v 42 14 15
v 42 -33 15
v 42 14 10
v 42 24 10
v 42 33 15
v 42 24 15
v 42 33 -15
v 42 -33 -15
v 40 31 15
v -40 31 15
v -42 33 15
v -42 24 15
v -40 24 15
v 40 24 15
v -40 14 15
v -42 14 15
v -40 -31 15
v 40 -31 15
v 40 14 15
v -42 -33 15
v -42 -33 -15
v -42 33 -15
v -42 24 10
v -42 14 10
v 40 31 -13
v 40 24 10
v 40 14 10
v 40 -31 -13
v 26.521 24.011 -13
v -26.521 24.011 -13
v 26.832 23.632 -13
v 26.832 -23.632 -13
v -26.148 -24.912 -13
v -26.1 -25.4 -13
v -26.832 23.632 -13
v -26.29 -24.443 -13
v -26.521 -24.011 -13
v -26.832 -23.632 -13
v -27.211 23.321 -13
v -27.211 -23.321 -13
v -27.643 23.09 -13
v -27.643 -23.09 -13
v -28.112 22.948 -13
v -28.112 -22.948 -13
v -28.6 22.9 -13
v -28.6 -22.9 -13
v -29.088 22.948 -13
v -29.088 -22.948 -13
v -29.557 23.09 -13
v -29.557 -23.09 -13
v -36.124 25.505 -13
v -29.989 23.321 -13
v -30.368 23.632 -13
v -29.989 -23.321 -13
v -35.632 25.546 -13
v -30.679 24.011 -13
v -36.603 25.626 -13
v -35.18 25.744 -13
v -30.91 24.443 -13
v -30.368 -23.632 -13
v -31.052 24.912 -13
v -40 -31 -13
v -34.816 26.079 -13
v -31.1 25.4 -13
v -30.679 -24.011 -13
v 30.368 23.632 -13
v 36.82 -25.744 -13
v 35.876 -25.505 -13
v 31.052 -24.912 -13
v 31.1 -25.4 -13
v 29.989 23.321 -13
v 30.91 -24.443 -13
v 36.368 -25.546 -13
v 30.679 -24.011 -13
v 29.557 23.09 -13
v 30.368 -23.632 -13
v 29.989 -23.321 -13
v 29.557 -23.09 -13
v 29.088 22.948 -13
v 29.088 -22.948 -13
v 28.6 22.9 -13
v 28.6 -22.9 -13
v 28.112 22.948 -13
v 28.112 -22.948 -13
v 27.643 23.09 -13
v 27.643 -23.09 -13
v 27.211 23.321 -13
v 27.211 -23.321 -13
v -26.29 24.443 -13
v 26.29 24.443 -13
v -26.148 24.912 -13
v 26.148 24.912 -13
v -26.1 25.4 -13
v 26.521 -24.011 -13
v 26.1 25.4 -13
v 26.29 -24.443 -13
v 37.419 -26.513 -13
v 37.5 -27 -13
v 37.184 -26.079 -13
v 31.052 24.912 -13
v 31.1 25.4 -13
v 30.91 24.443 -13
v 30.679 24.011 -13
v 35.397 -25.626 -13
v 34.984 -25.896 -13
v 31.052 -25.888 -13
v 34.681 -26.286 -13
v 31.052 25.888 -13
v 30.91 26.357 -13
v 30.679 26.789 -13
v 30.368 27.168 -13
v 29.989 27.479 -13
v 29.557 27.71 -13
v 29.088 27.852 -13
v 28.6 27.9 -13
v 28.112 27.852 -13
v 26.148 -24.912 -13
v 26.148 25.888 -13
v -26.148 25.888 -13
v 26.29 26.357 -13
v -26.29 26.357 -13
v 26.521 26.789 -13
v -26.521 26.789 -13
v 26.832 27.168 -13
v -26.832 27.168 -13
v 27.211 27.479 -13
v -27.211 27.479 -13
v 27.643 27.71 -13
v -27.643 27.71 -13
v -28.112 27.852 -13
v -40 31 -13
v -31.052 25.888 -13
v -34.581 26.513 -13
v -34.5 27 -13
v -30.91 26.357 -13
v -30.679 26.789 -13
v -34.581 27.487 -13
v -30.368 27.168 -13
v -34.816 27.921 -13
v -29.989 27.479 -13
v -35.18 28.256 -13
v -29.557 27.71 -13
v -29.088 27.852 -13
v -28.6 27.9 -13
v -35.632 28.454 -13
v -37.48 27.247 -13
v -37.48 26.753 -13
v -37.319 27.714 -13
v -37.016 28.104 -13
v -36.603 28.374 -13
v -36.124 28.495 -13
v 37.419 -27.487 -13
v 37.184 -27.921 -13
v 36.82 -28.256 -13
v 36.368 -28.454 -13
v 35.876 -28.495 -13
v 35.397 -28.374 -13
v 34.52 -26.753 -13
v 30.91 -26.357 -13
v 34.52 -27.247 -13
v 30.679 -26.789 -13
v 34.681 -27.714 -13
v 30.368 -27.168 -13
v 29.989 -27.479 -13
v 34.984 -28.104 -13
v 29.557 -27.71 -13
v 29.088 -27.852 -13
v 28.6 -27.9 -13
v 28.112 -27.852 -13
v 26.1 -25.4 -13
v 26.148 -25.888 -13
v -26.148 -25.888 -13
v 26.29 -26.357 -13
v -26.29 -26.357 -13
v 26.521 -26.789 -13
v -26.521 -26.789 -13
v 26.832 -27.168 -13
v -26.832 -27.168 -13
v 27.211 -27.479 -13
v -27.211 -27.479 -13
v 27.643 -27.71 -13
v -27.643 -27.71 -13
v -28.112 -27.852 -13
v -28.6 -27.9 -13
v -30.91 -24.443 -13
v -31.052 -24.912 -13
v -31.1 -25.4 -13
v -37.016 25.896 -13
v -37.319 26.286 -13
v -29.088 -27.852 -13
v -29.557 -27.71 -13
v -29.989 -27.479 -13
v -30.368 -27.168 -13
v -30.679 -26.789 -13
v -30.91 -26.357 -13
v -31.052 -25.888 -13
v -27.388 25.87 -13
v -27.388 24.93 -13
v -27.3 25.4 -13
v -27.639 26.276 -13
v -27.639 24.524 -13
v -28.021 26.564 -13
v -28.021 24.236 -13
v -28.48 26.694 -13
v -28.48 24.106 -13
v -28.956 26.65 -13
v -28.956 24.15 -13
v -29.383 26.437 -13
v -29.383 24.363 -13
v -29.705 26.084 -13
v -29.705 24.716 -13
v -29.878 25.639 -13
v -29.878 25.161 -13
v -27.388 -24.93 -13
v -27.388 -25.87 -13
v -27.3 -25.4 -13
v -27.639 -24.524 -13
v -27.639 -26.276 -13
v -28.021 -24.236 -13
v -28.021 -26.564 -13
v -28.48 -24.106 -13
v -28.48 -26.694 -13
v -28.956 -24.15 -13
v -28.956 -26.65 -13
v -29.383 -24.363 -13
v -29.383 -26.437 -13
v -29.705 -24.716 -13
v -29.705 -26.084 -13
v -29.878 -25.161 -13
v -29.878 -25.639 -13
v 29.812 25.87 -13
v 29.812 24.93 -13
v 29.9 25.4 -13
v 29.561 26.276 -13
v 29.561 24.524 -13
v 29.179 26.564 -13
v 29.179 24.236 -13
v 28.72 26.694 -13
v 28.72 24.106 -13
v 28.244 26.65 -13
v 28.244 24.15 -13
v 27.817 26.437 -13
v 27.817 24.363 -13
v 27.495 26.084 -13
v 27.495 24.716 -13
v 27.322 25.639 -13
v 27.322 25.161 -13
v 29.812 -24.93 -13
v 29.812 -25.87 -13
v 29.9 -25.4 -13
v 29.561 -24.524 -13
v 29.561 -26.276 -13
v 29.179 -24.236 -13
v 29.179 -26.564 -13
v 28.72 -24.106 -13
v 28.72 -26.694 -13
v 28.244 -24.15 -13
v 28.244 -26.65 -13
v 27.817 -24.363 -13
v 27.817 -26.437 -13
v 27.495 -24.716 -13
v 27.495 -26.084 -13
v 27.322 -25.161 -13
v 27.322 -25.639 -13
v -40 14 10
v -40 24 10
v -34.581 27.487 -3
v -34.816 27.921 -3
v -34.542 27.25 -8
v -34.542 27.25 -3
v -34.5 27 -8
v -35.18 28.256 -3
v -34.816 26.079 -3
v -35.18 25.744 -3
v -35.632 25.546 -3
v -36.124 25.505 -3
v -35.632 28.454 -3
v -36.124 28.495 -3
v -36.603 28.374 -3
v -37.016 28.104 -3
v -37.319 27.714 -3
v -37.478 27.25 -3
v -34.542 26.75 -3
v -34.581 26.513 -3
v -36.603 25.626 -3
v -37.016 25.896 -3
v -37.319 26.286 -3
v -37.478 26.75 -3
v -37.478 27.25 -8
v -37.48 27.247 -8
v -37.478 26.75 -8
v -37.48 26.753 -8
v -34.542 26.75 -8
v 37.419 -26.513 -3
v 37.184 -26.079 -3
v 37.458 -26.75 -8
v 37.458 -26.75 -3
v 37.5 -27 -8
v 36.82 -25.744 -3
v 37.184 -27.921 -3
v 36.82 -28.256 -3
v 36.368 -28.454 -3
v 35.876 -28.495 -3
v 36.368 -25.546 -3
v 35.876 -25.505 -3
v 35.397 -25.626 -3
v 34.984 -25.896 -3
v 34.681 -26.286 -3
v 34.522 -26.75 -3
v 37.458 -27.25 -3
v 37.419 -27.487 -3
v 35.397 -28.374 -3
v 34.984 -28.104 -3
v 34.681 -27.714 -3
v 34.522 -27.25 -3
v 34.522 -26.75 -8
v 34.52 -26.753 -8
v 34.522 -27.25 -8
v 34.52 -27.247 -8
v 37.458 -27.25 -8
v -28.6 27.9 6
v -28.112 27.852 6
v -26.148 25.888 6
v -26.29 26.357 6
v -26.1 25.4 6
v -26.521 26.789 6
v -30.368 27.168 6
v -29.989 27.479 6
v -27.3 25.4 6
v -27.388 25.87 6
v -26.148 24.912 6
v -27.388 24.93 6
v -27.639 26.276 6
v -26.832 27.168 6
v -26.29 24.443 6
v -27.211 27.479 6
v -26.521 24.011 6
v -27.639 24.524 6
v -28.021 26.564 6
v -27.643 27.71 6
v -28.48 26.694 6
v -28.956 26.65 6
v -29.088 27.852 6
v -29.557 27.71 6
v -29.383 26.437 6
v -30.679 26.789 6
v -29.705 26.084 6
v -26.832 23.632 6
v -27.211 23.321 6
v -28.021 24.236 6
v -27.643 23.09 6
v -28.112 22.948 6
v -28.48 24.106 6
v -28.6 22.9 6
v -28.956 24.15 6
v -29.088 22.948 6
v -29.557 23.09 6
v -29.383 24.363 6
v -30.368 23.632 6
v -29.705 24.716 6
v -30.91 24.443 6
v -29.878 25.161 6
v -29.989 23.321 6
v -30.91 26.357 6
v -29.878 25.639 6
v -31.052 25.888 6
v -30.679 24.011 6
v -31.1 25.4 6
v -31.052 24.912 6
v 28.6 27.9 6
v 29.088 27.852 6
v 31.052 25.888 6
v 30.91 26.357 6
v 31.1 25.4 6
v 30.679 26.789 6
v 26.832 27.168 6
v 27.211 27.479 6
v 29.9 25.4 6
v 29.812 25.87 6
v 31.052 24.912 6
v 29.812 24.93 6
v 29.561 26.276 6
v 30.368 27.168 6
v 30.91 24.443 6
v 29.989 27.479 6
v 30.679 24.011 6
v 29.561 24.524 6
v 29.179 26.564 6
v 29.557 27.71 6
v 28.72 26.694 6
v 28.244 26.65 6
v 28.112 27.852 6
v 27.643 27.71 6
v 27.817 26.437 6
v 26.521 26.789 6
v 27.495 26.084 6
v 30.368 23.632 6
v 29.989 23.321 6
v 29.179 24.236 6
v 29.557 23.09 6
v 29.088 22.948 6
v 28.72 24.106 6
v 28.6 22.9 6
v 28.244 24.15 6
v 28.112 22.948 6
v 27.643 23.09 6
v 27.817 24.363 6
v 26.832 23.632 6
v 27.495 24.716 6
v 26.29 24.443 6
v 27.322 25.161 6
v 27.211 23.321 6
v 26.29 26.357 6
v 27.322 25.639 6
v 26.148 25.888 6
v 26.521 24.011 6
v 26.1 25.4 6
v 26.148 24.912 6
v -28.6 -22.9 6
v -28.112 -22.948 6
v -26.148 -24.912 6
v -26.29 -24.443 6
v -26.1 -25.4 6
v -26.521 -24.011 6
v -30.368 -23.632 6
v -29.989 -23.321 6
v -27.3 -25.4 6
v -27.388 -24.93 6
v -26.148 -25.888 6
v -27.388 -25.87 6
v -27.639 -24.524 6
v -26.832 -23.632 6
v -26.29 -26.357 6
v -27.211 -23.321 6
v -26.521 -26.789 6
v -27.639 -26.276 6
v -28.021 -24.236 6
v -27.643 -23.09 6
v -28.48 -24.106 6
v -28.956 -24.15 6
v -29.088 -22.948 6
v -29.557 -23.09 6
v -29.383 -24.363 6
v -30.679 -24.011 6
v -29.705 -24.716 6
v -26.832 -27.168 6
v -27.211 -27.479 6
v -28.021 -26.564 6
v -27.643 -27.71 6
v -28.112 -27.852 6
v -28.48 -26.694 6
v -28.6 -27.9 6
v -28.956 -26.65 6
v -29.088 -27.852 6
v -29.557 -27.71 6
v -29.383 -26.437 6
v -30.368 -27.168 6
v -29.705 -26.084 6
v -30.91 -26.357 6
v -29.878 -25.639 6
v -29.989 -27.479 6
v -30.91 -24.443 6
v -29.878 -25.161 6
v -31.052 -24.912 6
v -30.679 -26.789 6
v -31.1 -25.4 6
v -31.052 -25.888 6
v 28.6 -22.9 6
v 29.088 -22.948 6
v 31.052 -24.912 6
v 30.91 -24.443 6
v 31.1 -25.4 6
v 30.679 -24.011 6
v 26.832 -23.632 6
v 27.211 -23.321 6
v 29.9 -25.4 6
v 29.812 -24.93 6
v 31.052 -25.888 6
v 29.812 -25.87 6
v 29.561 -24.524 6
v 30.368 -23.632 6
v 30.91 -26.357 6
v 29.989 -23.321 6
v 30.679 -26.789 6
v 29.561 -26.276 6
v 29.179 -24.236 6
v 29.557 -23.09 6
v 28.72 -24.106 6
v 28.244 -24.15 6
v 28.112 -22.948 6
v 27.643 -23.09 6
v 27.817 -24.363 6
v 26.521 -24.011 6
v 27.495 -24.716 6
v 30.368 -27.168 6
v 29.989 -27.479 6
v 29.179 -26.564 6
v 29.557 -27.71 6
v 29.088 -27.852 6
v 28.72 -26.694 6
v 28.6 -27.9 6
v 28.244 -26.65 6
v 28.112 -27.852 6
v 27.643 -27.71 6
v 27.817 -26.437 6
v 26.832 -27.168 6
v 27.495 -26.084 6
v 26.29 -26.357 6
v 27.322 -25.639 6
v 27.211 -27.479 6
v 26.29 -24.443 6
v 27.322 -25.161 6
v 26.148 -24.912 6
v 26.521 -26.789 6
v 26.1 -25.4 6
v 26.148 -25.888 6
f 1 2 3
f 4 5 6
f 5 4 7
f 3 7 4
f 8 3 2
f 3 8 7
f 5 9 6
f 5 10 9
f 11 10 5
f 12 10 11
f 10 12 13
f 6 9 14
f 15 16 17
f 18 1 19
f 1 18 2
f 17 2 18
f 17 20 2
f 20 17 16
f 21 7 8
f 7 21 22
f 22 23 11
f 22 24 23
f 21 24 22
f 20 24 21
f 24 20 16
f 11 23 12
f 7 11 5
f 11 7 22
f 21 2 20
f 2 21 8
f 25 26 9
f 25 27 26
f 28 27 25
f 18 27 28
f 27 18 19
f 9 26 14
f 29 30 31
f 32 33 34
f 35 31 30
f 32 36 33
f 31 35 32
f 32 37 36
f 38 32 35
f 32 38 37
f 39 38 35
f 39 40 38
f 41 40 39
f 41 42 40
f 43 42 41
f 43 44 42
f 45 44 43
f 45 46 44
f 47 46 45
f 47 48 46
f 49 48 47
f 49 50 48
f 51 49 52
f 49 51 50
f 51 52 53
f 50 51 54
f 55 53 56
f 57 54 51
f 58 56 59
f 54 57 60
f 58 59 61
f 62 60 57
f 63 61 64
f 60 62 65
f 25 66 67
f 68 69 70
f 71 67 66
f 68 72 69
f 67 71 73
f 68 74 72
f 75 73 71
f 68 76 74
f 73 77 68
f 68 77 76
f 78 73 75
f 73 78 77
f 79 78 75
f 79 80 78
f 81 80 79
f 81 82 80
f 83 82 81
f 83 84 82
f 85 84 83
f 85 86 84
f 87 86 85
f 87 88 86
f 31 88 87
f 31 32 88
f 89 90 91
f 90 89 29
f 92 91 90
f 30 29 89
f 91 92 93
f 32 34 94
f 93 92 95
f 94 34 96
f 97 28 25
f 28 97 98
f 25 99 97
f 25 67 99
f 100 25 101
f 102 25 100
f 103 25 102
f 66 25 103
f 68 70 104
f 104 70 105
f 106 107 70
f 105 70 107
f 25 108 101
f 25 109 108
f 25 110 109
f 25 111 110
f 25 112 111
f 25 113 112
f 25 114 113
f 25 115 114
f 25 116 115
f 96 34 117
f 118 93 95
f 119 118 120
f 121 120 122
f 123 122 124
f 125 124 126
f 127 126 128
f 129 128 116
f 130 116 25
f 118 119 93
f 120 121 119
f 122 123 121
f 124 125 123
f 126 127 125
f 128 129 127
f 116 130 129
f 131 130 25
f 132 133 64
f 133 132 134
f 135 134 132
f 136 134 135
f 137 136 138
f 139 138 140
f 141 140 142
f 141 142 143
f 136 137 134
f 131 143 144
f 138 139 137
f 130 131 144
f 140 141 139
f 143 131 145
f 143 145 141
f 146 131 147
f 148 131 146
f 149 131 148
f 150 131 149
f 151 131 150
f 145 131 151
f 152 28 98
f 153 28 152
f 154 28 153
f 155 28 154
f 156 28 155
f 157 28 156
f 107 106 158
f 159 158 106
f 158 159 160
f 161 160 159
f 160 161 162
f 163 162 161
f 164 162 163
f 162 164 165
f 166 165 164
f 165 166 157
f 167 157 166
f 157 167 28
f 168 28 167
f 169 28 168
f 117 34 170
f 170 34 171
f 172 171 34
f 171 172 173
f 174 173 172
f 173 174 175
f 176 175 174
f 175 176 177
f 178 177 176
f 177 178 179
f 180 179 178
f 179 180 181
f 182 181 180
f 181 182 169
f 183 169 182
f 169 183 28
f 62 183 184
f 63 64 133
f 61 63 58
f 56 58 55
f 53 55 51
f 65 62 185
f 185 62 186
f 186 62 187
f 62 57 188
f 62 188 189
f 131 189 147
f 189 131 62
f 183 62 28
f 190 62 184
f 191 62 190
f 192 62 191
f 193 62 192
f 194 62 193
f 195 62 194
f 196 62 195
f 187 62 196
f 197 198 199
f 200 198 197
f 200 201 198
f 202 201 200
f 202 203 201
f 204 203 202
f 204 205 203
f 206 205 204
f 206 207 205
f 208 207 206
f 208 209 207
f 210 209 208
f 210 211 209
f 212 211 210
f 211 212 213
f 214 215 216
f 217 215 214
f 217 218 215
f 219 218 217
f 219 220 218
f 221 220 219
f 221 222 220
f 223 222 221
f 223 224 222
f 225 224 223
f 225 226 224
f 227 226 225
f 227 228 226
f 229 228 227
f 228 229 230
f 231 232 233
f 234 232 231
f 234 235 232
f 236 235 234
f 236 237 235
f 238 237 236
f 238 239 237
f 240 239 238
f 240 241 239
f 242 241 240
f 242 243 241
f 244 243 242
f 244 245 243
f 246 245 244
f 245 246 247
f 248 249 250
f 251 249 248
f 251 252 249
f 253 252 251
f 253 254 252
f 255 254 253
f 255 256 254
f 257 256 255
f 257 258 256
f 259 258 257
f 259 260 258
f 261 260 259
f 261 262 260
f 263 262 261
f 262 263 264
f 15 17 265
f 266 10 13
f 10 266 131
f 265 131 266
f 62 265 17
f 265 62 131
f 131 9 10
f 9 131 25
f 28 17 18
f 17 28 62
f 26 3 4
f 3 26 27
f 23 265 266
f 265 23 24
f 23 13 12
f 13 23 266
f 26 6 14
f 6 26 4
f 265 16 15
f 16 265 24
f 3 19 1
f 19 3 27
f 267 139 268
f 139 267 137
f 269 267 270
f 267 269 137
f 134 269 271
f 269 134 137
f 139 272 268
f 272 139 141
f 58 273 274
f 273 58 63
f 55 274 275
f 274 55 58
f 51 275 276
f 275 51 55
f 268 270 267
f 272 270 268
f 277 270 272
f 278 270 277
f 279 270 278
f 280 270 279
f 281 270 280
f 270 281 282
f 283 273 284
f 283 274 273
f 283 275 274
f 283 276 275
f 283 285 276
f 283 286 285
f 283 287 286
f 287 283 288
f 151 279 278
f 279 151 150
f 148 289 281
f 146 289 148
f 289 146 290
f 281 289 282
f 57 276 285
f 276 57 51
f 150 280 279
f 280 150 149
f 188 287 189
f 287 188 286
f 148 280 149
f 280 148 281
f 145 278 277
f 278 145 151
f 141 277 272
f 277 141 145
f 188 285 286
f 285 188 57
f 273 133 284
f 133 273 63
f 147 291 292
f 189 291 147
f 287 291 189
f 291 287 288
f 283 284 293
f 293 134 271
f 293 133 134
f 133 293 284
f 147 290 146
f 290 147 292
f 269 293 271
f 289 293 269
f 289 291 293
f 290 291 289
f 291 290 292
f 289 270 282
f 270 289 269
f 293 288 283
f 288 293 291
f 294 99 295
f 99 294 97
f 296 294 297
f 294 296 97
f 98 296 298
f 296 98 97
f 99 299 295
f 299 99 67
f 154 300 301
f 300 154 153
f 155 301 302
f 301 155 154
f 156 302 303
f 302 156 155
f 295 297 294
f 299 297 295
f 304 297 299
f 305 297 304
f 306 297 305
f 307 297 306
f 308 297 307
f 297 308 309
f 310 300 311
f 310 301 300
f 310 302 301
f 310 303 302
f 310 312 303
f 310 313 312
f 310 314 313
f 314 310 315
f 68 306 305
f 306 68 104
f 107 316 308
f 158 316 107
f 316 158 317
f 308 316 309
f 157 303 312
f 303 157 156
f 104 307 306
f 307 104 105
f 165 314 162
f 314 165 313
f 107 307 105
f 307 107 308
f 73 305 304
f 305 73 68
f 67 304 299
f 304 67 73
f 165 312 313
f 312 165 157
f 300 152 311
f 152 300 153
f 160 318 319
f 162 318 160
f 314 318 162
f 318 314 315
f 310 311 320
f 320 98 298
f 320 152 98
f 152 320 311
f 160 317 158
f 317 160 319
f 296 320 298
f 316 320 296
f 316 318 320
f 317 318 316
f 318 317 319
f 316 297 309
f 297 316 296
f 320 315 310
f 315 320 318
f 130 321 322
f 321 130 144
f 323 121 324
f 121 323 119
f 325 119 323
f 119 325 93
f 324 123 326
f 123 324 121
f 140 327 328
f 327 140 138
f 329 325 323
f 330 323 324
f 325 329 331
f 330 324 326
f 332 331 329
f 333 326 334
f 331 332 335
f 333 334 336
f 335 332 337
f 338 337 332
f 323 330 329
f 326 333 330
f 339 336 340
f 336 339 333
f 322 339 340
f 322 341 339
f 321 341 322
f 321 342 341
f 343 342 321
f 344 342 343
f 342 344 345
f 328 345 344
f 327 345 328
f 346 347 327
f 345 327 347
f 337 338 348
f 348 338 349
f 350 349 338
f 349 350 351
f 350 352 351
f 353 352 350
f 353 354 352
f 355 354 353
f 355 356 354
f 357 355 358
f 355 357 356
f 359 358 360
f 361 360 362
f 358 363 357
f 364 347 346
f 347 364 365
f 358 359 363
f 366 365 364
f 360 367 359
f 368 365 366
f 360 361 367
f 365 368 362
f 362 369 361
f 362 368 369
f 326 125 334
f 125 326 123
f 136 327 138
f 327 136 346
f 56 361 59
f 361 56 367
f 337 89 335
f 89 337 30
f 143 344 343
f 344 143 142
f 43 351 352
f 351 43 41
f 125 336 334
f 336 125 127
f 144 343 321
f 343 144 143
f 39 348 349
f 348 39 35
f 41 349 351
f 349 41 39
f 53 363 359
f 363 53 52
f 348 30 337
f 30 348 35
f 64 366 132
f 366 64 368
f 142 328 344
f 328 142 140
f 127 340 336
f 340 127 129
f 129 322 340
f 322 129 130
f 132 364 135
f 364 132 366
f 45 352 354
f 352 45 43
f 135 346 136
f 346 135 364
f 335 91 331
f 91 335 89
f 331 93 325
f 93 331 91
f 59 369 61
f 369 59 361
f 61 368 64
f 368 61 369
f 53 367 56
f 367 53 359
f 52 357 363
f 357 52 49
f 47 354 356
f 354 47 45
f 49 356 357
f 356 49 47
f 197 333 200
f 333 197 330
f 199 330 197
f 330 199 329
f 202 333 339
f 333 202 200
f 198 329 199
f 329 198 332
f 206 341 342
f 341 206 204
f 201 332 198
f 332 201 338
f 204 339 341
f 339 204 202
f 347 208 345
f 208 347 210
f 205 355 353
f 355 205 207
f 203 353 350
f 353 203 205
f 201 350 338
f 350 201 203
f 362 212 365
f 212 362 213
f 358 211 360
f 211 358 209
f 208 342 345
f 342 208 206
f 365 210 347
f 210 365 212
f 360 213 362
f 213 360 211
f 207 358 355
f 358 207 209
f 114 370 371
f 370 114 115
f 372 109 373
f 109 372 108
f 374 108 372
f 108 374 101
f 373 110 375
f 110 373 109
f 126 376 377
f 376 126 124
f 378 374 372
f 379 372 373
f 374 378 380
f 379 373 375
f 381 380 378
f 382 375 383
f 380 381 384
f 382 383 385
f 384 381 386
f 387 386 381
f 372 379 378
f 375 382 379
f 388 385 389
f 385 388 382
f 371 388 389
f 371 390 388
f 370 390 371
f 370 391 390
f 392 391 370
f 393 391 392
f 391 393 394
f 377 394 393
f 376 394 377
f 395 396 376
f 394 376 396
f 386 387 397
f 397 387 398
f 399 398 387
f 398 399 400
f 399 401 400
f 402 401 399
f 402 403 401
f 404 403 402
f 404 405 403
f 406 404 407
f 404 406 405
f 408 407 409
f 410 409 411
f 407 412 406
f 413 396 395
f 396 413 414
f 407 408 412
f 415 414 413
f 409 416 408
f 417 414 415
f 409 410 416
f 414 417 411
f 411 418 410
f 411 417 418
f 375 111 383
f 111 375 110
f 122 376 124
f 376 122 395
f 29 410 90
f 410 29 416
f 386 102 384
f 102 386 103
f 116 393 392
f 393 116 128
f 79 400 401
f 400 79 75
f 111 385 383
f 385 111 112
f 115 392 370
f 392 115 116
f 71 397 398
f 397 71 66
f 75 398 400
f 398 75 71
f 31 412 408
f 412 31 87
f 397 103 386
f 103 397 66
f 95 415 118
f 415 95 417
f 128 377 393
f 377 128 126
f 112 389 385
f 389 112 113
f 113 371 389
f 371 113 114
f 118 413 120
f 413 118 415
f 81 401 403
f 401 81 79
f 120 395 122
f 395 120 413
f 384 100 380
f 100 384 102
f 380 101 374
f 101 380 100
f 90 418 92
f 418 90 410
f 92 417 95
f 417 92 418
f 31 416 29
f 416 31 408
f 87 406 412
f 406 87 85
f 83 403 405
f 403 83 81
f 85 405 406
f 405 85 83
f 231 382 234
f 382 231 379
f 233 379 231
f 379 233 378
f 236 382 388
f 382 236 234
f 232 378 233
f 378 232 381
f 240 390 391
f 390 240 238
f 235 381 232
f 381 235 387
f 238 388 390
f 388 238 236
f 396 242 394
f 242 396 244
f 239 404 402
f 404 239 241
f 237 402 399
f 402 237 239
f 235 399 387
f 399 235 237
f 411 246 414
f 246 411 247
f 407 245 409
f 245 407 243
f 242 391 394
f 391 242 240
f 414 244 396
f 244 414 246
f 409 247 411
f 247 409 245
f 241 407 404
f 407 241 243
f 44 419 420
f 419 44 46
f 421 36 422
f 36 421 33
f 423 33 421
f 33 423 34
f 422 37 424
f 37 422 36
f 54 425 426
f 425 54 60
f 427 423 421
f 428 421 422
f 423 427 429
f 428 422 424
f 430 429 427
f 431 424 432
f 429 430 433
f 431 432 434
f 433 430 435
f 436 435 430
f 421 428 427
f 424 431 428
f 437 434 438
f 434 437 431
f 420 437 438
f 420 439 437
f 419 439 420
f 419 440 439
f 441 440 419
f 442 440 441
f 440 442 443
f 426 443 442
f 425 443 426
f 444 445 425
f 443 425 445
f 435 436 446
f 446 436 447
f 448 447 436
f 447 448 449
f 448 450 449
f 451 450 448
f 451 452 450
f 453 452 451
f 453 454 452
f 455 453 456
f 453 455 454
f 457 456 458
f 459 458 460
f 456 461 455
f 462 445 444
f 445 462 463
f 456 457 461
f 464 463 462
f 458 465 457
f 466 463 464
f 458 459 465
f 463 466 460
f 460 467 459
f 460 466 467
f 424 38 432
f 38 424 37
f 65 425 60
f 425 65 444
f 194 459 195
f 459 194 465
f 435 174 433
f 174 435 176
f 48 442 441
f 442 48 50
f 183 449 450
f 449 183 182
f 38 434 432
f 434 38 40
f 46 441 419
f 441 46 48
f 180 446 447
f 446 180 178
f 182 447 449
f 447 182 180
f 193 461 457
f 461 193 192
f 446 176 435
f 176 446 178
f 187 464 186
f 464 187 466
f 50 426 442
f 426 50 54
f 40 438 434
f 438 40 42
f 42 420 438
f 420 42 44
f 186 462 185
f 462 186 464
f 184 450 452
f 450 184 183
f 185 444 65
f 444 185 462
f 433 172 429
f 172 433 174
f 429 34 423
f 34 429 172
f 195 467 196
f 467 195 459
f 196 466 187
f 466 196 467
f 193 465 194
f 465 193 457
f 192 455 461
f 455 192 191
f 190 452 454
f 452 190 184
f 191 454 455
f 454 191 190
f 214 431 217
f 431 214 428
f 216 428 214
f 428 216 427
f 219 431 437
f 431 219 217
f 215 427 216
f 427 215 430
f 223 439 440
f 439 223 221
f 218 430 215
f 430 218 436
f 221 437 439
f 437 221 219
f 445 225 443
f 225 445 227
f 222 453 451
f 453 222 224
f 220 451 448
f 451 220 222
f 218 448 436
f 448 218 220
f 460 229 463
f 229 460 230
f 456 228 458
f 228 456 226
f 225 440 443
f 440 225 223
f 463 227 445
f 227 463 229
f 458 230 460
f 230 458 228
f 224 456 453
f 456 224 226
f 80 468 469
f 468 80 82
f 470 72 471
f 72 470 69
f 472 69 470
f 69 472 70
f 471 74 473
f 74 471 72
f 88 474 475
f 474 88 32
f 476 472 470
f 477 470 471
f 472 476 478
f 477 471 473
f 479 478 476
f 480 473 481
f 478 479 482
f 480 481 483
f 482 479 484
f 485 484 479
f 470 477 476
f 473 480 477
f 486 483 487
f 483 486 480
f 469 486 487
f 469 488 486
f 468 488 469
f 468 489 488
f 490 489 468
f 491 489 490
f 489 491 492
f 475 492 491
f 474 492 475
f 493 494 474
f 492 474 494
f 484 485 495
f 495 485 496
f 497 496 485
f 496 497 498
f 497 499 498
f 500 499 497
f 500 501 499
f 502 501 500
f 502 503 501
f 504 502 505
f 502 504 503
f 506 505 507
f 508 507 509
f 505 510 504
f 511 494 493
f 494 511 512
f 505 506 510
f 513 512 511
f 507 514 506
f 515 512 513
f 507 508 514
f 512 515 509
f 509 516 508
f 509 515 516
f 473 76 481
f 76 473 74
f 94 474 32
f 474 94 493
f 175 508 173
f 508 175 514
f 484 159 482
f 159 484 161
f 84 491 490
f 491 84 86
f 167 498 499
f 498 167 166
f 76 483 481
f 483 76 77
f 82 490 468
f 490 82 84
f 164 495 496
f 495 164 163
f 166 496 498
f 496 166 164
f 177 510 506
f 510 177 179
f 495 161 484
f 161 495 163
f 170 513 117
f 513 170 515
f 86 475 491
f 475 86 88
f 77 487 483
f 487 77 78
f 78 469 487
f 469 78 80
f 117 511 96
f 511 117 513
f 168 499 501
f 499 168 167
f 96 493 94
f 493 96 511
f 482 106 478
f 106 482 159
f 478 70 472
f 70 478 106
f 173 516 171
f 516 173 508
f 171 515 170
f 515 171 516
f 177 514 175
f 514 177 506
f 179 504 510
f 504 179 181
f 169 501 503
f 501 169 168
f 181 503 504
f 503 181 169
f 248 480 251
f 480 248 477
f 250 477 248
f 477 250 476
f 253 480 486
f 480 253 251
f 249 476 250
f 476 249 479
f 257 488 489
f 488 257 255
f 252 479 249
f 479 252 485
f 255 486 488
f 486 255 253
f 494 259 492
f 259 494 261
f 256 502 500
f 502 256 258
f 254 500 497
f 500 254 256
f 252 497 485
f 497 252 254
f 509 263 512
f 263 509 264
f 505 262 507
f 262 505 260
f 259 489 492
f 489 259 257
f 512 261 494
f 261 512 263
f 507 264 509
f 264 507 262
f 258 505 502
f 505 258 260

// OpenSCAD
$fa = 10;
$fs = 0.5;

module case_top(size, radius, thickness) {
    width = size[0];
    height = size[1];
    depth = size[2];
    
    difference() {
        cube([width, height, depth], center=true);

        translate([0, 0, thickness]) {
            // make case hollow
            cube([width - thickness * 2, height - thickness * 2, depth], center=true);
        }
    }
}

module pcb_column(height, innerHeight, outer, inner) {
    union() {
        translate([0, 0, 0]) {
            cylinder(h=height, r=outer, center=true);
            translate([0, 0, (innerHeight - height) / 2]) cylinder(h=innerHeight, r=inner, center=true);
        }
    }
}

module pcb_column(height, outer, inner) {
    difference() {
        cylinder(h=height, r=outer);
        cylinder(h=height, r=inner);
    }
}

module pcb_columns() {
    translate([-28.6, 25.4, 0]) pcb_column(19, 2.5, 1.3);
    translate([28.6, 25.4, 0]) pcb_column(19, 2.5, 1.3);
    translate([-28.6, -25.4, 0]) pcb_column(19, 2.5, 1.3);
    translate([28.6, -25.4, 0]) pcb_column(19, 2.5, 1.3);
}

module case_pin(height, r) {
    difference() {
        cylinder(h=height, r=r);
        translate([0, 0, height - 5 / 2]) cube([10, 0.5, 5], center=true);
    }
}

module case_pins() {
    translate([-36, 27, 0]) case_pin(10, 1.5);
    translate([36, -27, 0]) case_pin(10, 1.5);
}

module main() {
    union() {
        difference() {
            case_top([84, 66, 30], 3, 2);
            // Cut out for cables ...
            translate([0, 19, 12.5]) cube([84, 10, 5], center=true);
        }
        translate([0, 0, -13]) {
            case_pins();
            pcb_columns();
        }
        
    }
}

main();
